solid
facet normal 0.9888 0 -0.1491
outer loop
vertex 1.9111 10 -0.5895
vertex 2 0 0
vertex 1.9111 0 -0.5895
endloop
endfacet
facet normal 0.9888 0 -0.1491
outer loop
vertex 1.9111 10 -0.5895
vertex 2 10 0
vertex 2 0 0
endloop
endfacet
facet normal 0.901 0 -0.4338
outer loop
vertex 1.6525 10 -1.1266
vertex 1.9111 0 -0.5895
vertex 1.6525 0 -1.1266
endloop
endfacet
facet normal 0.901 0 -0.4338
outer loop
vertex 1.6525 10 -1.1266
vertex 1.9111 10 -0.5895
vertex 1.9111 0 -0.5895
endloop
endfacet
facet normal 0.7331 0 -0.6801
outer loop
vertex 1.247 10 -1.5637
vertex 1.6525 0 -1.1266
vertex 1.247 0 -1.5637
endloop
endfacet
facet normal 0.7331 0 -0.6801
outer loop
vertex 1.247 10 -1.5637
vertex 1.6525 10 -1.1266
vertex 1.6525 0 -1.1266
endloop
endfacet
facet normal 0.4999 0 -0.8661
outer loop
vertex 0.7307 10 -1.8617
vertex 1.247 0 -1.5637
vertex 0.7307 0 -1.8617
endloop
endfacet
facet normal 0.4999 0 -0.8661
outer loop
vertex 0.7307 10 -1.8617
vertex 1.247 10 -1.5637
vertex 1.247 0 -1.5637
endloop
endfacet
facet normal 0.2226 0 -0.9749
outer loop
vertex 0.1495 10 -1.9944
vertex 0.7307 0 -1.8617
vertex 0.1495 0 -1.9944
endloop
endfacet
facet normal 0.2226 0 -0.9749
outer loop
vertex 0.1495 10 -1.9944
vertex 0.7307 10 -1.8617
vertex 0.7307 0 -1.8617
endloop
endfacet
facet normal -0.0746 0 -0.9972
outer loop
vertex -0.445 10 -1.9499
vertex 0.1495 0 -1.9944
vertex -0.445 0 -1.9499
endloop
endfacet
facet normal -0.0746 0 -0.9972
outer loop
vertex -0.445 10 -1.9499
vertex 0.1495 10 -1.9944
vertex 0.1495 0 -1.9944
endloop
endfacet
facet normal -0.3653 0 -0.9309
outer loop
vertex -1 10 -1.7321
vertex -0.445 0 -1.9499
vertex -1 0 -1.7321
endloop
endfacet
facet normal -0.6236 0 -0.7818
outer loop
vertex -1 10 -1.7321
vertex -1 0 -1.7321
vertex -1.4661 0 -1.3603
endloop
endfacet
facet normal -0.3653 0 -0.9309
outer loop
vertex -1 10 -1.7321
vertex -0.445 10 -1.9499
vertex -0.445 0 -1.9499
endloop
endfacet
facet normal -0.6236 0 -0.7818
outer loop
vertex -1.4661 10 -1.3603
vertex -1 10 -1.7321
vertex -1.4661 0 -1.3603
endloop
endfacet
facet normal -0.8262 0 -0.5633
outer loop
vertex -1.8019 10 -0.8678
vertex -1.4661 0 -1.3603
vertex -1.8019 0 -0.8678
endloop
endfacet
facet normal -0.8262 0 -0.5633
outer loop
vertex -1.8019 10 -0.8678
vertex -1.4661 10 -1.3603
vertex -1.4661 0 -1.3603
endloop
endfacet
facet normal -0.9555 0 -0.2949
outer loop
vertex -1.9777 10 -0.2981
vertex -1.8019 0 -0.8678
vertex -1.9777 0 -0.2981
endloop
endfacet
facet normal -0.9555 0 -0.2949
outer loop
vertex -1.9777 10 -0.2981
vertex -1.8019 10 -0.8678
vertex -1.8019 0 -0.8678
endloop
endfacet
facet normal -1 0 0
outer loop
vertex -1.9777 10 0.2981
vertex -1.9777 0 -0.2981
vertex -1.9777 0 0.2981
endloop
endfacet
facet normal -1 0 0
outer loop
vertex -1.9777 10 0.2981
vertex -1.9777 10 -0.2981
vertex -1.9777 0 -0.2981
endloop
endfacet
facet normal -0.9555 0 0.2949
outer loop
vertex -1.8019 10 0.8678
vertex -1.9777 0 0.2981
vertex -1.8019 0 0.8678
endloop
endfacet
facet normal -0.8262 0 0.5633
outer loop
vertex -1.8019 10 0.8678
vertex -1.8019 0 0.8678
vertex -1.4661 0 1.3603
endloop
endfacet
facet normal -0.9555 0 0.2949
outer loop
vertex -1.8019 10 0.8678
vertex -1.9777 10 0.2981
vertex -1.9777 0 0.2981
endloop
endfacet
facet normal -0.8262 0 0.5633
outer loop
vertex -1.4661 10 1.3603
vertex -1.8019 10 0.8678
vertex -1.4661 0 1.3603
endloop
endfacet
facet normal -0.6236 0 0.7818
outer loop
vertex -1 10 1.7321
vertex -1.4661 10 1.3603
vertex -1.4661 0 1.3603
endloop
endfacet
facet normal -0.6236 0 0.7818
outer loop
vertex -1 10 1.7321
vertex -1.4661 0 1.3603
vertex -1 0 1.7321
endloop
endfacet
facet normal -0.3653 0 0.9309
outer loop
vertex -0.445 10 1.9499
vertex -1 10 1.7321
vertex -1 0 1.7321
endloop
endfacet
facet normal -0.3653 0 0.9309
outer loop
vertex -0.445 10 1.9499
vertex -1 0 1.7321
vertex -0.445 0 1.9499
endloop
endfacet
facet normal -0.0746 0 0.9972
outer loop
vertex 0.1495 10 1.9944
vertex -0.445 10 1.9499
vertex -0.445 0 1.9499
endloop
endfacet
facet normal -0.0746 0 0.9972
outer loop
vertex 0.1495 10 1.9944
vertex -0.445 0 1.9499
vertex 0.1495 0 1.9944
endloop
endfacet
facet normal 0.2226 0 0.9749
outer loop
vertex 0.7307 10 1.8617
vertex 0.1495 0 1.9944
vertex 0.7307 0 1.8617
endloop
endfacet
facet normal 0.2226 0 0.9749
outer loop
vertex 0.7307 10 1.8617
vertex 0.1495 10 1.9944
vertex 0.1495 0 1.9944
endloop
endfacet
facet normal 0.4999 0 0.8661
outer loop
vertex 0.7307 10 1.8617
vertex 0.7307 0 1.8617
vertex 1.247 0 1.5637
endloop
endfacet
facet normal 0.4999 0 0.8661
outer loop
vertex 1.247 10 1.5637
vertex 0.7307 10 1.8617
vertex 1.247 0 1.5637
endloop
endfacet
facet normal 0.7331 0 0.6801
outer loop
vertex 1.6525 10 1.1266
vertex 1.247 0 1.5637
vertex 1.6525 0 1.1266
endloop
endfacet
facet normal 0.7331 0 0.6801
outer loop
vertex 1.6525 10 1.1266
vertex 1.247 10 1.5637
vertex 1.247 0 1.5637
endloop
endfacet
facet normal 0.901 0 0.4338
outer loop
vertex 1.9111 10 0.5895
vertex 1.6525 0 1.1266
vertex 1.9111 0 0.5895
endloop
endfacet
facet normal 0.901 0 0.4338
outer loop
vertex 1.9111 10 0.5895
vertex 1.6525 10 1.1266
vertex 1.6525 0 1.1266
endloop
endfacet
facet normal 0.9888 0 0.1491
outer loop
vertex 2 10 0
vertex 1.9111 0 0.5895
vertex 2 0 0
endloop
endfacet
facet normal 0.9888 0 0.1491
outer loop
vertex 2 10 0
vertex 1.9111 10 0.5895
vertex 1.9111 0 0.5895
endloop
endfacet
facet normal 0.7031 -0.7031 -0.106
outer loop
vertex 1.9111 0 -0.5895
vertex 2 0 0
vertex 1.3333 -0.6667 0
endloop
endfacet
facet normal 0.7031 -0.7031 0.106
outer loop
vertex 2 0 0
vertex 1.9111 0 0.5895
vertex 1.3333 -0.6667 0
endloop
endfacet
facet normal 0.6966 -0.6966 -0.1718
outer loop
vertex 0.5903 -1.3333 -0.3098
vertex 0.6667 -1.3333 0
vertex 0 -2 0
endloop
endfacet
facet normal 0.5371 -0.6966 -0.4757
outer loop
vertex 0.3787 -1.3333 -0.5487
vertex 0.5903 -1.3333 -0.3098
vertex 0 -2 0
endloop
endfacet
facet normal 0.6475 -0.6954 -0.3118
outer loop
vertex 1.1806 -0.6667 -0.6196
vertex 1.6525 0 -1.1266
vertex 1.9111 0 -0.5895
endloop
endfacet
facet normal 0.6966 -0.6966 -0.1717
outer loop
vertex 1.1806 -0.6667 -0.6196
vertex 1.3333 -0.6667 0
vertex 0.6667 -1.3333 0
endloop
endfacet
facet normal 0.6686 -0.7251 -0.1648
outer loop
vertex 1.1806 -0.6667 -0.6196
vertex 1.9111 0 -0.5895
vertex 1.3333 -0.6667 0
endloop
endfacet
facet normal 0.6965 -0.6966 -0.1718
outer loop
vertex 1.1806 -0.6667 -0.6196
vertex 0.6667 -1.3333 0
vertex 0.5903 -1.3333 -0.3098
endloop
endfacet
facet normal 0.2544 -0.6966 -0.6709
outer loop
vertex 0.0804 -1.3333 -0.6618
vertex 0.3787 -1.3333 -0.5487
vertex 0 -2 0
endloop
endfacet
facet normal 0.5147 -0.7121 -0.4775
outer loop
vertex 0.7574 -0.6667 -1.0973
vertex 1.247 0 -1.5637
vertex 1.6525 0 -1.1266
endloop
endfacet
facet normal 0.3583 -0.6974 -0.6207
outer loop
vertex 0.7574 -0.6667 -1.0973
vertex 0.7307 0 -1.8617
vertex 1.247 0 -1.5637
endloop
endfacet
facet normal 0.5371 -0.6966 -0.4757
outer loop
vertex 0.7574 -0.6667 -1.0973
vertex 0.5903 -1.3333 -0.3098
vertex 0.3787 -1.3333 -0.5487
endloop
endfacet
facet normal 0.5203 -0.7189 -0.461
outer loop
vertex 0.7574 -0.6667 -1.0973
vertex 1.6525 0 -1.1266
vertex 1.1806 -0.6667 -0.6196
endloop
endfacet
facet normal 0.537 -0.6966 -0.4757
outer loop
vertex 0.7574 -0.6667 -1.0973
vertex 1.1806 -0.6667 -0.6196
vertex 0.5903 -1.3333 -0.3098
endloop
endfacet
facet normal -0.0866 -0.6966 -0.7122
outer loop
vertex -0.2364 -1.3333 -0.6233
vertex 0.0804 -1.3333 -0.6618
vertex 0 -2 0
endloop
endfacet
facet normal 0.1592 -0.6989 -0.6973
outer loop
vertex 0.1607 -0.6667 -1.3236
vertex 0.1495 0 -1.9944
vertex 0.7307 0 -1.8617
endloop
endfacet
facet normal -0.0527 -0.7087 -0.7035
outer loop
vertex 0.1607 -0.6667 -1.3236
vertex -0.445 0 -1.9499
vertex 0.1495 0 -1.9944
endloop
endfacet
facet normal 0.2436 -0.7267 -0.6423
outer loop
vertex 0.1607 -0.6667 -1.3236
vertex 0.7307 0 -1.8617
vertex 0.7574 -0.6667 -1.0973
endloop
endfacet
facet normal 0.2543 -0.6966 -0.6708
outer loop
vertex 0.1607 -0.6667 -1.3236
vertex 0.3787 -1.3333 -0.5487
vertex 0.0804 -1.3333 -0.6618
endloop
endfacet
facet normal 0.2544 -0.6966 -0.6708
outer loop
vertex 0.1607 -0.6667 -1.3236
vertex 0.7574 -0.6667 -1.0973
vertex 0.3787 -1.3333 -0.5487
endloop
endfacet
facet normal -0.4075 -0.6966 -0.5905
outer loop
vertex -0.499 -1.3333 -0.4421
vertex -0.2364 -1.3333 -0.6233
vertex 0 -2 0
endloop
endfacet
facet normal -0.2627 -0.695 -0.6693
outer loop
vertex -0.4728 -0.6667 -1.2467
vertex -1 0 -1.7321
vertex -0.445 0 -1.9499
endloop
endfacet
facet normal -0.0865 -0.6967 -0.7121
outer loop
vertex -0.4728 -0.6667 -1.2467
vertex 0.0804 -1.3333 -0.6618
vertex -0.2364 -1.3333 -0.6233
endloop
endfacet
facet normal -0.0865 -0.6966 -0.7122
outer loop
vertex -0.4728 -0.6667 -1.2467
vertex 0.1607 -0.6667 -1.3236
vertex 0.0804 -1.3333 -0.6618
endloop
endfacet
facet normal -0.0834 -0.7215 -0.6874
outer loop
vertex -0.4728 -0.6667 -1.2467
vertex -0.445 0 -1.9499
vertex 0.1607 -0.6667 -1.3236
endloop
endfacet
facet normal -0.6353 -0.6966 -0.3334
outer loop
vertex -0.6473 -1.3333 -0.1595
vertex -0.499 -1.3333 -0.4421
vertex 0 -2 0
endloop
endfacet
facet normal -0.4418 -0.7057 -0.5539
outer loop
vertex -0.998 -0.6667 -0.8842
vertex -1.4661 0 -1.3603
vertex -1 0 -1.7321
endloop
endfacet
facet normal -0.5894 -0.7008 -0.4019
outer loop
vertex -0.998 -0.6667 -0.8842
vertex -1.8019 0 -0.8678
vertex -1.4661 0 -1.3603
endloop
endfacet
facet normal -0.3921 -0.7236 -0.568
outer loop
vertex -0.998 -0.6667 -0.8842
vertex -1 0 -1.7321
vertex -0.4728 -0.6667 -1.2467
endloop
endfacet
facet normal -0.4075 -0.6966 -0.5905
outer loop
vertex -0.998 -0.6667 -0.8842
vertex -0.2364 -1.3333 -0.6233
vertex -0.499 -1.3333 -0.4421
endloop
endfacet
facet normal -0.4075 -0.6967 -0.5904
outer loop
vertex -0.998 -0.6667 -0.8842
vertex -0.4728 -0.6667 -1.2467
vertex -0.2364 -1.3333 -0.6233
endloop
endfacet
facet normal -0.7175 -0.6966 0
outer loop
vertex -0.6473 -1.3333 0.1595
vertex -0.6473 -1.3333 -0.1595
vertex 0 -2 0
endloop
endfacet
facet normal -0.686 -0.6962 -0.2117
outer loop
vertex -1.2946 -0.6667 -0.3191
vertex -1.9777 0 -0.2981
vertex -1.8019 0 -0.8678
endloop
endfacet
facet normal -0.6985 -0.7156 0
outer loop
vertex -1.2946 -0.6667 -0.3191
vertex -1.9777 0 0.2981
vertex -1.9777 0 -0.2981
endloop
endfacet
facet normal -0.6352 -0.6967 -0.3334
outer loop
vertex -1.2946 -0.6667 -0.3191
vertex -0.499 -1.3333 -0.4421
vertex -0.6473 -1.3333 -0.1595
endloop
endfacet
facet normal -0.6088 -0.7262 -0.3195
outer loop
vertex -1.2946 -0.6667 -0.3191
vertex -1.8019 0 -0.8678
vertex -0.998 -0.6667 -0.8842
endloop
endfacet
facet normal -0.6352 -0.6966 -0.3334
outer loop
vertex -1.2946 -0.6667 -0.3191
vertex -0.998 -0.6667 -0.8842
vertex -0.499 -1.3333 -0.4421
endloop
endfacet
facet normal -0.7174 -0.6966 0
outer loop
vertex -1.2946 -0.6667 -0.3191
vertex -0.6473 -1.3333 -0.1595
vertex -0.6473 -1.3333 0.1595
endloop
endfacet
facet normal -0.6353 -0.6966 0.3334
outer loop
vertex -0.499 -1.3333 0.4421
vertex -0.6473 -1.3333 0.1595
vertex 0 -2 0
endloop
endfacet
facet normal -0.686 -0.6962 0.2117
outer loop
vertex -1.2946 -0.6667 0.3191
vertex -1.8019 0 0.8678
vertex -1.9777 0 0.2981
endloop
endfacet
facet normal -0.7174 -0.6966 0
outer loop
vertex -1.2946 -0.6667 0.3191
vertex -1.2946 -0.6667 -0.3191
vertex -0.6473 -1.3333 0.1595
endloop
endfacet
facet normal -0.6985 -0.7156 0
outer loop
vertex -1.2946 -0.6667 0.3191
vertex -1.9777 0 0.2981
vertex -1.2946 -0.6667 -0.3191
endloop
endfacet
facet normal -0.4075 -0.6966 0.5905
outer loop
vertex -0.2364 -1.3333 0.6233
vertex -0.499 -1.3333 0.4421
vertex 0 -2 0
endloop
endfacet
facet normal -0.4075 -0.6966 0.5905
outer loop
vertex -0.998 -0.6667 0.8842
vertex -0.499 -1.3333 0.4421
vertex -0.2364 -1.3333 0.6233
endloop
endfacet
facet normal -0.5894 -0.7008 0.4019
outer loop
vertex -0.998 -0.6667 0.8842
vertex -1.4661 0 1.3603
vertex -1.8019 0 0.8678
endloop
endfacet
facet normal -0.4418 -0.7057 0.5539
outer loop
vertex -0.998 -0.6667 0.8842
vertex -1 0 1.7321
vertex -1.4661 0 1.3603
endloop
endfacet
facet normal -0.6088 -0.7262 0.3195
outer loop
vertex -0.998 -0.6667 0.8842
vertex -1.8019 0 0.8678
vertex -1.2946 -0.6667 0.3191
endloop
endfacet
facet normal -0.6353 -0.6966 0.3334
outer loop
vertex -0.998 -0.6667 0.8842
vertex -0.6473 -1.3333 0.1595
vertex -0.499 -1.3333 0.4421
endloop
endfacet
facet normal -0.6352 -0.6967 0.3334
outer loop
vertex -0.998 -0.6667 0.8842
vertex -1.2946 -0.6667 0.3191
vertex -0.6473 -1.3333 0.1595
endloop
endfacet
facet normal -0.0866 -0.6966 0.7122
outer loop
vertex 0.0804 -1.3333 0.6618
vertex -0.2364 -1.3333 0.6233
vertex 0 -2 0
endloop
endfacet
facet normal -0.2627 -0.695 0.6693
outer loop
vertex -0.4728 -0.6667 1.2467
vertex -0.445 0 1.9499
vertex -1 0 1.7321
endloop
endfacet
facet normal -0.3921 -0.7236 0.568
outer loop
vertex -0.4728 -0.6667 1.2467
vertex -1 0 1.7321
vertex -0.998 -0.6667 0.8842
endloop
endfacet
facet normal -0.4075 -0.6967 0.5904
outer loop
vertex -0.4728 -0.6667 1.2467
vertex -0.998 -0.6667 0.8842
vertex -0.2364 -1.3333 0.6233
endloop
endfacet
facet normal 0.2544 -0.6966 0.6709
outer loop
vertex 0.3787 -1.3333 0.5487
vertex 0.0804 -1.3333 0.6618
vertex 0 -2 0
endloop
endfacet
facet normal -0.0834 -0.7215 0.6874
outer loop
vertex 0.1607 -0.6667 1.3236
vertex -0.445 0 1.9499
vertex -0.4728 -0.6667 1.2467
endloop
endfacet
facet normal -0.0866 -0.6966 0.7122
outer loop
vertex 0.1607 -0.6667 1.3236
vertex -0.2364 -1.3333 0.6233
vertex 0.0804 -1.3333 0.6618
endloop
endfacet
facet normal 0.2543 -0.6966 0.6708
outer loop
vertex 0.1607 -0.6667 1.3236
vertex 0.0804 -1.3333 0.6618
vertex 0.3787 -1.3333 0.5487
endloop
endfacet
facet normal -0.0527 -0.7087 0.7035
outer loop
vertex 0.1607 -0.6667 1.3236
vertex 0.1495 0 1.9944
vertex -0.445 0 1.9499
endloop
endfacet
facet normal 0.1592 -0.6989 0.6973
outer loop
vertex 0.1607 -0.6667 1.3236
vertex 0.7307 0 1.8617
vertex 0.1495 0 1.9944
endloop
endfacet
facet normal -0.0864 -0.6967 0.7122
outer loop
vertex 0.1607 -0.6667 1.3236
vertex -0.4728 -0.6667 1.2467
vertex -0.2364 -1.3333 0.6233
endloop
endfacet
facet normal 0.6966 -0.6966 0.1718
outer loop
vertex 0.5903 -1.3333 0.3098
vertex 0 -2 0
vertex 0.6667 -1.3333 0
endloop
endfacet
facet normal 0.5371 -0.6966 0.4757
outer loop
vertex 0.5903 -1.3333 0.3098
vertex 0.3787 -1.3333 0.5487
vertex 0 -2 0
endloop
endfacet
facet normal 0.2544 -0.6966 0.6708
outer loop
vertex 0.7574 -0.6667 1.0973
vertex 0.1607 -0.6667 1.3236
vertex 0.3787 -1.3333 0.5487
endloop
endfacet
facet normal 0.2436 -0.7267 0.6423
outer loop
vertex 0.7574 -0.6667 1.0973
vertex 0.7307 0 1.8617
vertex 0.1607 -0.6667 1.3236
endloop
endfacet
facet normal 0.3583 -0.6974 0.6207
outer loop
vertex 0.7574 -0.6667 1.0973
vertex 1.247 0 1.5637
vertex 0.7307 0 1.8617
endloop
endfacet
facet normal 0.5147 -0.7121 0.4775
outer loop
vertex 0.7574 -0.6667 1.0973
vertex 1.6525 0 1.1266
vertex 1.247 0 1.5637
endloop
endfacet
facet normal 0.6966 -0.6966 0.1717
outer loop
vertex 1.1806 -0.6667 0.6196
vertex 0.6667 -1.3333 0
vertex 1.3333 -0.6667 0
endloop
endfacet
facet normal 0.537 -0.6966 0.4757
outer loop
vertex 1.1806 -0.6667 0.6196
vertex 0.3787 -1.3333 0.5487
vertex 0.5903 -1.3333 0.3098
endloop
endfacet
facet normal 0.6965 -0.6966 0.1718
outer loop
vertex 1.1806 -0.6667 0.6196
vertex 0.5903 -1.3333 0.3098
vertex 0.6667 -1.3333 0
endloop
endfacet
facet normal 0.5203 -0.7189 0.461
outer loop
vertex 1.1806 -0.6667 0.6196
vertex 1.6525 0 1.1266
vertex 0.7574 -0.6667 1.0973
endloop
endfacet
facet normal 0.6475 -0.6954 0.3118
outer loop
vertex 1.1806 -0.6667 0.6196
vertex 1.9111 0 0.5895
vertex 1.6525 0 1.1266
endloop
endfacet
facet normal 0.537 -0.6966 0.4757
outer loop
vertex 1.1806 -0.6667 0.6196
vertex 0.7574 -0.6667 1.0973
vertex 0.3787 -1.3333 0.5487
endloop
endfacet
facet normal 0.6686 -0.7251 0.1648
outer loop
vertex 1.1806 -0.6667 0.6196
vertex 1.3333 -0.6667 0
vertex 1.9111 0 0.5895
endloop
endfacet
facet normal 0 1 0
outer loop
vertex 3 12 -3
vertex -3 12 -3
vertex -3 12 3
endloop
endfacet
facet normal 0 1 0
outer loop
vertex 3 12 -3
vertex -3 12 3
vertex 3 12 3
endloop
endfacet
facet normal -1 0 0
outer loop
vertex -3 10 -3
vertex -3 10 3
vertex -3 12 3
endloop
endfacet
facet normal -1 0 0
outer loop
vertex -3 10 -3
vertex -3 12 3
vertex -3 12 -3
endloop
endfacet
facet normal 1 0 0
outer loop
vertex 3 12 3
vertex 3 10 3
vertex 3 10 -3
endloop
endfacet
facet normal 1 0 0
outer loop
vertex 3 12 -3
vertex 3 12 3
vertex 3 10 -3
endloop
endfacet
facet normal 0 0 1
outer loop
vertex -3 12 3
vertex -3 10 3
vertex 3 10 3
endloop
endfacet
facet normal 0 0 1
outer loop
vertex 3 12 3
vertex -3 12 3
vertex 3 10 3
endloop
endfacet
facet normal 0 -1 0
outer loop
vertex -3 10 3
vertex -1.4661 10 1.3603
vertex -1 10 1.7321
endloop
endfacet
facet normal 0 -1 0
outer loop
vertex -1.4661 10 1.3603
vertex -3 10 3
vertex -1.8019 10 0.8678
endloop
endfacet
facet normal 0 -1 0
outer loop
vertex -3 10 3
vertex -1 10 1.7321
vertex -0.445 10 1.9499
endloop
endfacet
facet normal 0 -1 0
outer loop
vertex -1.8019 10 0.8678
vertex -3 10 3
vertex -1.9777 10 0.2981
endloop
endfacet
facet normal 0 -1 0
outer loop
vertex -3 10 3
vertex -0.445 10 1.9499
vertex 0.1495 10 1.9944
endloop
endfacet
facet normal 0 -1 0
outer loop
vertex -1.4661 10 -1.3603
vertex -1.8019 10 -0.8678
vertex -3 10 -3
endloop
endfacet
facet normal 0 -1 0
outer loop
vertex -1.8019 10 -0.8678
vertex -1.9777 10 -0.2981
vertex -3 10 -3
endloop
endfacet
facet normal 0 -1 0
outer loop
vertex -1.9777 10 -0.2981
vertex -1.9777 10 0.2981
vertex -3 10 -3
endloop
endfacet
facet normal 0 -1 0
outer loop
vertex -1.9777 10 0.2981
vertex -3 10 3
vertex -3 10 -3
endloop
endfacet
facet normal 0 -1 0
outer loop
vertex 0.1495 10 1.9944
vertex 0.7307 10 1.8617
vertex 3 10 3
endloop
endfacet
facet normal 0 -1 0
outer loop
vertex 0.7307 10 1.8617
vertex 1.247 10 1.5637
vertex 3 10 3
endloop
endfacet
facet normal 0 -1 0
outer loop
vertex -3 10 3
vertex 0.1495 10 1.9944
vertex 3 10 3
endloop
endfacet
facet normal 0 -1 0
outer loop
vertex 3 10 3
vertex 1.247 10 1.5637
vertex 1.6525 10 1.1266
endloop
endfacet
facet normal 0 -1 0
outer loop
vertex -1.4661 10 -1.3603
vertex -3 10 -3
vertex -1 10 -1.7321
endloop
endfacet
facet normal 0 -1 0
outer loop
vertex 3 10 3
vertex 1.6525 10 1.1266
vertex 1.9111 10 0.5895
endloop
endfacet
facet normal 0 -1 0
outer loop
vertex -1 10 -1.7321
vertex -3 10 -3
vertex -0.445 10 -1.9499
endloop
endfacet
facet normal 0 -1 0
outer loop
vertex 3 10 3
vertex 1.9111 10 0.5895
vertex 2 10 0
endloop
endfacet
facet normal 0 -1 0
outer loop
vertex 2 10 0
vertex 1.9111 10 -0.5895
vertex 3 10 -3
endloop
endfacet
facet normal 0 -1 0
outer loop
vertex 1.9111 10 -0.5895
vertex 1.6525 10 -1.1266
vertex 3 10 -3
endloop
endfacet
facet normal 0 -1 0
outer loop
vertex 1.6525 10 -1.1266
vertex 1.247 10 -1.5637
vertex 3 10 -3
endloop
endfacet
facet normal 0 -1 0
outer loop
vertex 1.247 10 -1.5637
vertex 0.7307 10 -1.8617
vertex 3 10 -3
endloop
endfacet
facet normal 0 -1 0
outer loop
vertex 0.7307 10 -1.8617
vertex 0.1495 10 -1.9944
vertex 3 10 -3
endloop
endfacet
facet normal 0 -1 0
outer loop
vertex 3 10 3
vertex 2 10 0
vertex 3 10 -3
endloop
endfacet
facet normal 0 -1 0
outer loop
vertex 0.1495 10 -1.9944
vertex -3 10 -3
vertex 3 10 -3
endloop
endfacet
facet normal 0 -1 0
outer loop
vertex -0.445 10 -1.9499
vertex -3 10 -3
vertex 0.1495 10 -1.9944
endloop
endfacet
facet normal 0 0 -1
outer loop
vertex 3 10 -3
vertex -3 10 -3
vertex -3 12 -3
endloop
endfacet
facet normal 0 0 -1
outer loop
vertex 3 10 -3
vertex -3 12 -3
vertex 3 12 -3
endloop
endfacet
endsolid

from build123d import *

# Parameters (mm, degrees)
CROQUIS2_W              = 6
CROQUIS2_H              = 6
SALIENTE_EXTRUIR2_DEPTH = 2


# Read off the part's stored shape, not the designer's step: Saliente-Extruir1
with BuildPart() as part:
    # Saliente-Extruir1 outline → Saliente-Extruir1 (revolve)
    with BuildSketch(Plane.XY):
        Polygon((0, 10), (0, -2), (2, 0), (2, 10), align=None)
    revolve(axis=Axis((0, 0, 0), (0, 1, 0)))

    # Croquis2 → Saliente-Extruir2 (add)
    with BuildSketch(Plane(origin=(0, 10, 0), x_dir=(1, 0, 0), z_dir=(0, 1, 0))):
        Rectangle(CROQUIS2_W, CROQUIS2_H)
    extrude(amount=SALIENTE_EXTRUIR2_DEPTH)


solid = part.part
